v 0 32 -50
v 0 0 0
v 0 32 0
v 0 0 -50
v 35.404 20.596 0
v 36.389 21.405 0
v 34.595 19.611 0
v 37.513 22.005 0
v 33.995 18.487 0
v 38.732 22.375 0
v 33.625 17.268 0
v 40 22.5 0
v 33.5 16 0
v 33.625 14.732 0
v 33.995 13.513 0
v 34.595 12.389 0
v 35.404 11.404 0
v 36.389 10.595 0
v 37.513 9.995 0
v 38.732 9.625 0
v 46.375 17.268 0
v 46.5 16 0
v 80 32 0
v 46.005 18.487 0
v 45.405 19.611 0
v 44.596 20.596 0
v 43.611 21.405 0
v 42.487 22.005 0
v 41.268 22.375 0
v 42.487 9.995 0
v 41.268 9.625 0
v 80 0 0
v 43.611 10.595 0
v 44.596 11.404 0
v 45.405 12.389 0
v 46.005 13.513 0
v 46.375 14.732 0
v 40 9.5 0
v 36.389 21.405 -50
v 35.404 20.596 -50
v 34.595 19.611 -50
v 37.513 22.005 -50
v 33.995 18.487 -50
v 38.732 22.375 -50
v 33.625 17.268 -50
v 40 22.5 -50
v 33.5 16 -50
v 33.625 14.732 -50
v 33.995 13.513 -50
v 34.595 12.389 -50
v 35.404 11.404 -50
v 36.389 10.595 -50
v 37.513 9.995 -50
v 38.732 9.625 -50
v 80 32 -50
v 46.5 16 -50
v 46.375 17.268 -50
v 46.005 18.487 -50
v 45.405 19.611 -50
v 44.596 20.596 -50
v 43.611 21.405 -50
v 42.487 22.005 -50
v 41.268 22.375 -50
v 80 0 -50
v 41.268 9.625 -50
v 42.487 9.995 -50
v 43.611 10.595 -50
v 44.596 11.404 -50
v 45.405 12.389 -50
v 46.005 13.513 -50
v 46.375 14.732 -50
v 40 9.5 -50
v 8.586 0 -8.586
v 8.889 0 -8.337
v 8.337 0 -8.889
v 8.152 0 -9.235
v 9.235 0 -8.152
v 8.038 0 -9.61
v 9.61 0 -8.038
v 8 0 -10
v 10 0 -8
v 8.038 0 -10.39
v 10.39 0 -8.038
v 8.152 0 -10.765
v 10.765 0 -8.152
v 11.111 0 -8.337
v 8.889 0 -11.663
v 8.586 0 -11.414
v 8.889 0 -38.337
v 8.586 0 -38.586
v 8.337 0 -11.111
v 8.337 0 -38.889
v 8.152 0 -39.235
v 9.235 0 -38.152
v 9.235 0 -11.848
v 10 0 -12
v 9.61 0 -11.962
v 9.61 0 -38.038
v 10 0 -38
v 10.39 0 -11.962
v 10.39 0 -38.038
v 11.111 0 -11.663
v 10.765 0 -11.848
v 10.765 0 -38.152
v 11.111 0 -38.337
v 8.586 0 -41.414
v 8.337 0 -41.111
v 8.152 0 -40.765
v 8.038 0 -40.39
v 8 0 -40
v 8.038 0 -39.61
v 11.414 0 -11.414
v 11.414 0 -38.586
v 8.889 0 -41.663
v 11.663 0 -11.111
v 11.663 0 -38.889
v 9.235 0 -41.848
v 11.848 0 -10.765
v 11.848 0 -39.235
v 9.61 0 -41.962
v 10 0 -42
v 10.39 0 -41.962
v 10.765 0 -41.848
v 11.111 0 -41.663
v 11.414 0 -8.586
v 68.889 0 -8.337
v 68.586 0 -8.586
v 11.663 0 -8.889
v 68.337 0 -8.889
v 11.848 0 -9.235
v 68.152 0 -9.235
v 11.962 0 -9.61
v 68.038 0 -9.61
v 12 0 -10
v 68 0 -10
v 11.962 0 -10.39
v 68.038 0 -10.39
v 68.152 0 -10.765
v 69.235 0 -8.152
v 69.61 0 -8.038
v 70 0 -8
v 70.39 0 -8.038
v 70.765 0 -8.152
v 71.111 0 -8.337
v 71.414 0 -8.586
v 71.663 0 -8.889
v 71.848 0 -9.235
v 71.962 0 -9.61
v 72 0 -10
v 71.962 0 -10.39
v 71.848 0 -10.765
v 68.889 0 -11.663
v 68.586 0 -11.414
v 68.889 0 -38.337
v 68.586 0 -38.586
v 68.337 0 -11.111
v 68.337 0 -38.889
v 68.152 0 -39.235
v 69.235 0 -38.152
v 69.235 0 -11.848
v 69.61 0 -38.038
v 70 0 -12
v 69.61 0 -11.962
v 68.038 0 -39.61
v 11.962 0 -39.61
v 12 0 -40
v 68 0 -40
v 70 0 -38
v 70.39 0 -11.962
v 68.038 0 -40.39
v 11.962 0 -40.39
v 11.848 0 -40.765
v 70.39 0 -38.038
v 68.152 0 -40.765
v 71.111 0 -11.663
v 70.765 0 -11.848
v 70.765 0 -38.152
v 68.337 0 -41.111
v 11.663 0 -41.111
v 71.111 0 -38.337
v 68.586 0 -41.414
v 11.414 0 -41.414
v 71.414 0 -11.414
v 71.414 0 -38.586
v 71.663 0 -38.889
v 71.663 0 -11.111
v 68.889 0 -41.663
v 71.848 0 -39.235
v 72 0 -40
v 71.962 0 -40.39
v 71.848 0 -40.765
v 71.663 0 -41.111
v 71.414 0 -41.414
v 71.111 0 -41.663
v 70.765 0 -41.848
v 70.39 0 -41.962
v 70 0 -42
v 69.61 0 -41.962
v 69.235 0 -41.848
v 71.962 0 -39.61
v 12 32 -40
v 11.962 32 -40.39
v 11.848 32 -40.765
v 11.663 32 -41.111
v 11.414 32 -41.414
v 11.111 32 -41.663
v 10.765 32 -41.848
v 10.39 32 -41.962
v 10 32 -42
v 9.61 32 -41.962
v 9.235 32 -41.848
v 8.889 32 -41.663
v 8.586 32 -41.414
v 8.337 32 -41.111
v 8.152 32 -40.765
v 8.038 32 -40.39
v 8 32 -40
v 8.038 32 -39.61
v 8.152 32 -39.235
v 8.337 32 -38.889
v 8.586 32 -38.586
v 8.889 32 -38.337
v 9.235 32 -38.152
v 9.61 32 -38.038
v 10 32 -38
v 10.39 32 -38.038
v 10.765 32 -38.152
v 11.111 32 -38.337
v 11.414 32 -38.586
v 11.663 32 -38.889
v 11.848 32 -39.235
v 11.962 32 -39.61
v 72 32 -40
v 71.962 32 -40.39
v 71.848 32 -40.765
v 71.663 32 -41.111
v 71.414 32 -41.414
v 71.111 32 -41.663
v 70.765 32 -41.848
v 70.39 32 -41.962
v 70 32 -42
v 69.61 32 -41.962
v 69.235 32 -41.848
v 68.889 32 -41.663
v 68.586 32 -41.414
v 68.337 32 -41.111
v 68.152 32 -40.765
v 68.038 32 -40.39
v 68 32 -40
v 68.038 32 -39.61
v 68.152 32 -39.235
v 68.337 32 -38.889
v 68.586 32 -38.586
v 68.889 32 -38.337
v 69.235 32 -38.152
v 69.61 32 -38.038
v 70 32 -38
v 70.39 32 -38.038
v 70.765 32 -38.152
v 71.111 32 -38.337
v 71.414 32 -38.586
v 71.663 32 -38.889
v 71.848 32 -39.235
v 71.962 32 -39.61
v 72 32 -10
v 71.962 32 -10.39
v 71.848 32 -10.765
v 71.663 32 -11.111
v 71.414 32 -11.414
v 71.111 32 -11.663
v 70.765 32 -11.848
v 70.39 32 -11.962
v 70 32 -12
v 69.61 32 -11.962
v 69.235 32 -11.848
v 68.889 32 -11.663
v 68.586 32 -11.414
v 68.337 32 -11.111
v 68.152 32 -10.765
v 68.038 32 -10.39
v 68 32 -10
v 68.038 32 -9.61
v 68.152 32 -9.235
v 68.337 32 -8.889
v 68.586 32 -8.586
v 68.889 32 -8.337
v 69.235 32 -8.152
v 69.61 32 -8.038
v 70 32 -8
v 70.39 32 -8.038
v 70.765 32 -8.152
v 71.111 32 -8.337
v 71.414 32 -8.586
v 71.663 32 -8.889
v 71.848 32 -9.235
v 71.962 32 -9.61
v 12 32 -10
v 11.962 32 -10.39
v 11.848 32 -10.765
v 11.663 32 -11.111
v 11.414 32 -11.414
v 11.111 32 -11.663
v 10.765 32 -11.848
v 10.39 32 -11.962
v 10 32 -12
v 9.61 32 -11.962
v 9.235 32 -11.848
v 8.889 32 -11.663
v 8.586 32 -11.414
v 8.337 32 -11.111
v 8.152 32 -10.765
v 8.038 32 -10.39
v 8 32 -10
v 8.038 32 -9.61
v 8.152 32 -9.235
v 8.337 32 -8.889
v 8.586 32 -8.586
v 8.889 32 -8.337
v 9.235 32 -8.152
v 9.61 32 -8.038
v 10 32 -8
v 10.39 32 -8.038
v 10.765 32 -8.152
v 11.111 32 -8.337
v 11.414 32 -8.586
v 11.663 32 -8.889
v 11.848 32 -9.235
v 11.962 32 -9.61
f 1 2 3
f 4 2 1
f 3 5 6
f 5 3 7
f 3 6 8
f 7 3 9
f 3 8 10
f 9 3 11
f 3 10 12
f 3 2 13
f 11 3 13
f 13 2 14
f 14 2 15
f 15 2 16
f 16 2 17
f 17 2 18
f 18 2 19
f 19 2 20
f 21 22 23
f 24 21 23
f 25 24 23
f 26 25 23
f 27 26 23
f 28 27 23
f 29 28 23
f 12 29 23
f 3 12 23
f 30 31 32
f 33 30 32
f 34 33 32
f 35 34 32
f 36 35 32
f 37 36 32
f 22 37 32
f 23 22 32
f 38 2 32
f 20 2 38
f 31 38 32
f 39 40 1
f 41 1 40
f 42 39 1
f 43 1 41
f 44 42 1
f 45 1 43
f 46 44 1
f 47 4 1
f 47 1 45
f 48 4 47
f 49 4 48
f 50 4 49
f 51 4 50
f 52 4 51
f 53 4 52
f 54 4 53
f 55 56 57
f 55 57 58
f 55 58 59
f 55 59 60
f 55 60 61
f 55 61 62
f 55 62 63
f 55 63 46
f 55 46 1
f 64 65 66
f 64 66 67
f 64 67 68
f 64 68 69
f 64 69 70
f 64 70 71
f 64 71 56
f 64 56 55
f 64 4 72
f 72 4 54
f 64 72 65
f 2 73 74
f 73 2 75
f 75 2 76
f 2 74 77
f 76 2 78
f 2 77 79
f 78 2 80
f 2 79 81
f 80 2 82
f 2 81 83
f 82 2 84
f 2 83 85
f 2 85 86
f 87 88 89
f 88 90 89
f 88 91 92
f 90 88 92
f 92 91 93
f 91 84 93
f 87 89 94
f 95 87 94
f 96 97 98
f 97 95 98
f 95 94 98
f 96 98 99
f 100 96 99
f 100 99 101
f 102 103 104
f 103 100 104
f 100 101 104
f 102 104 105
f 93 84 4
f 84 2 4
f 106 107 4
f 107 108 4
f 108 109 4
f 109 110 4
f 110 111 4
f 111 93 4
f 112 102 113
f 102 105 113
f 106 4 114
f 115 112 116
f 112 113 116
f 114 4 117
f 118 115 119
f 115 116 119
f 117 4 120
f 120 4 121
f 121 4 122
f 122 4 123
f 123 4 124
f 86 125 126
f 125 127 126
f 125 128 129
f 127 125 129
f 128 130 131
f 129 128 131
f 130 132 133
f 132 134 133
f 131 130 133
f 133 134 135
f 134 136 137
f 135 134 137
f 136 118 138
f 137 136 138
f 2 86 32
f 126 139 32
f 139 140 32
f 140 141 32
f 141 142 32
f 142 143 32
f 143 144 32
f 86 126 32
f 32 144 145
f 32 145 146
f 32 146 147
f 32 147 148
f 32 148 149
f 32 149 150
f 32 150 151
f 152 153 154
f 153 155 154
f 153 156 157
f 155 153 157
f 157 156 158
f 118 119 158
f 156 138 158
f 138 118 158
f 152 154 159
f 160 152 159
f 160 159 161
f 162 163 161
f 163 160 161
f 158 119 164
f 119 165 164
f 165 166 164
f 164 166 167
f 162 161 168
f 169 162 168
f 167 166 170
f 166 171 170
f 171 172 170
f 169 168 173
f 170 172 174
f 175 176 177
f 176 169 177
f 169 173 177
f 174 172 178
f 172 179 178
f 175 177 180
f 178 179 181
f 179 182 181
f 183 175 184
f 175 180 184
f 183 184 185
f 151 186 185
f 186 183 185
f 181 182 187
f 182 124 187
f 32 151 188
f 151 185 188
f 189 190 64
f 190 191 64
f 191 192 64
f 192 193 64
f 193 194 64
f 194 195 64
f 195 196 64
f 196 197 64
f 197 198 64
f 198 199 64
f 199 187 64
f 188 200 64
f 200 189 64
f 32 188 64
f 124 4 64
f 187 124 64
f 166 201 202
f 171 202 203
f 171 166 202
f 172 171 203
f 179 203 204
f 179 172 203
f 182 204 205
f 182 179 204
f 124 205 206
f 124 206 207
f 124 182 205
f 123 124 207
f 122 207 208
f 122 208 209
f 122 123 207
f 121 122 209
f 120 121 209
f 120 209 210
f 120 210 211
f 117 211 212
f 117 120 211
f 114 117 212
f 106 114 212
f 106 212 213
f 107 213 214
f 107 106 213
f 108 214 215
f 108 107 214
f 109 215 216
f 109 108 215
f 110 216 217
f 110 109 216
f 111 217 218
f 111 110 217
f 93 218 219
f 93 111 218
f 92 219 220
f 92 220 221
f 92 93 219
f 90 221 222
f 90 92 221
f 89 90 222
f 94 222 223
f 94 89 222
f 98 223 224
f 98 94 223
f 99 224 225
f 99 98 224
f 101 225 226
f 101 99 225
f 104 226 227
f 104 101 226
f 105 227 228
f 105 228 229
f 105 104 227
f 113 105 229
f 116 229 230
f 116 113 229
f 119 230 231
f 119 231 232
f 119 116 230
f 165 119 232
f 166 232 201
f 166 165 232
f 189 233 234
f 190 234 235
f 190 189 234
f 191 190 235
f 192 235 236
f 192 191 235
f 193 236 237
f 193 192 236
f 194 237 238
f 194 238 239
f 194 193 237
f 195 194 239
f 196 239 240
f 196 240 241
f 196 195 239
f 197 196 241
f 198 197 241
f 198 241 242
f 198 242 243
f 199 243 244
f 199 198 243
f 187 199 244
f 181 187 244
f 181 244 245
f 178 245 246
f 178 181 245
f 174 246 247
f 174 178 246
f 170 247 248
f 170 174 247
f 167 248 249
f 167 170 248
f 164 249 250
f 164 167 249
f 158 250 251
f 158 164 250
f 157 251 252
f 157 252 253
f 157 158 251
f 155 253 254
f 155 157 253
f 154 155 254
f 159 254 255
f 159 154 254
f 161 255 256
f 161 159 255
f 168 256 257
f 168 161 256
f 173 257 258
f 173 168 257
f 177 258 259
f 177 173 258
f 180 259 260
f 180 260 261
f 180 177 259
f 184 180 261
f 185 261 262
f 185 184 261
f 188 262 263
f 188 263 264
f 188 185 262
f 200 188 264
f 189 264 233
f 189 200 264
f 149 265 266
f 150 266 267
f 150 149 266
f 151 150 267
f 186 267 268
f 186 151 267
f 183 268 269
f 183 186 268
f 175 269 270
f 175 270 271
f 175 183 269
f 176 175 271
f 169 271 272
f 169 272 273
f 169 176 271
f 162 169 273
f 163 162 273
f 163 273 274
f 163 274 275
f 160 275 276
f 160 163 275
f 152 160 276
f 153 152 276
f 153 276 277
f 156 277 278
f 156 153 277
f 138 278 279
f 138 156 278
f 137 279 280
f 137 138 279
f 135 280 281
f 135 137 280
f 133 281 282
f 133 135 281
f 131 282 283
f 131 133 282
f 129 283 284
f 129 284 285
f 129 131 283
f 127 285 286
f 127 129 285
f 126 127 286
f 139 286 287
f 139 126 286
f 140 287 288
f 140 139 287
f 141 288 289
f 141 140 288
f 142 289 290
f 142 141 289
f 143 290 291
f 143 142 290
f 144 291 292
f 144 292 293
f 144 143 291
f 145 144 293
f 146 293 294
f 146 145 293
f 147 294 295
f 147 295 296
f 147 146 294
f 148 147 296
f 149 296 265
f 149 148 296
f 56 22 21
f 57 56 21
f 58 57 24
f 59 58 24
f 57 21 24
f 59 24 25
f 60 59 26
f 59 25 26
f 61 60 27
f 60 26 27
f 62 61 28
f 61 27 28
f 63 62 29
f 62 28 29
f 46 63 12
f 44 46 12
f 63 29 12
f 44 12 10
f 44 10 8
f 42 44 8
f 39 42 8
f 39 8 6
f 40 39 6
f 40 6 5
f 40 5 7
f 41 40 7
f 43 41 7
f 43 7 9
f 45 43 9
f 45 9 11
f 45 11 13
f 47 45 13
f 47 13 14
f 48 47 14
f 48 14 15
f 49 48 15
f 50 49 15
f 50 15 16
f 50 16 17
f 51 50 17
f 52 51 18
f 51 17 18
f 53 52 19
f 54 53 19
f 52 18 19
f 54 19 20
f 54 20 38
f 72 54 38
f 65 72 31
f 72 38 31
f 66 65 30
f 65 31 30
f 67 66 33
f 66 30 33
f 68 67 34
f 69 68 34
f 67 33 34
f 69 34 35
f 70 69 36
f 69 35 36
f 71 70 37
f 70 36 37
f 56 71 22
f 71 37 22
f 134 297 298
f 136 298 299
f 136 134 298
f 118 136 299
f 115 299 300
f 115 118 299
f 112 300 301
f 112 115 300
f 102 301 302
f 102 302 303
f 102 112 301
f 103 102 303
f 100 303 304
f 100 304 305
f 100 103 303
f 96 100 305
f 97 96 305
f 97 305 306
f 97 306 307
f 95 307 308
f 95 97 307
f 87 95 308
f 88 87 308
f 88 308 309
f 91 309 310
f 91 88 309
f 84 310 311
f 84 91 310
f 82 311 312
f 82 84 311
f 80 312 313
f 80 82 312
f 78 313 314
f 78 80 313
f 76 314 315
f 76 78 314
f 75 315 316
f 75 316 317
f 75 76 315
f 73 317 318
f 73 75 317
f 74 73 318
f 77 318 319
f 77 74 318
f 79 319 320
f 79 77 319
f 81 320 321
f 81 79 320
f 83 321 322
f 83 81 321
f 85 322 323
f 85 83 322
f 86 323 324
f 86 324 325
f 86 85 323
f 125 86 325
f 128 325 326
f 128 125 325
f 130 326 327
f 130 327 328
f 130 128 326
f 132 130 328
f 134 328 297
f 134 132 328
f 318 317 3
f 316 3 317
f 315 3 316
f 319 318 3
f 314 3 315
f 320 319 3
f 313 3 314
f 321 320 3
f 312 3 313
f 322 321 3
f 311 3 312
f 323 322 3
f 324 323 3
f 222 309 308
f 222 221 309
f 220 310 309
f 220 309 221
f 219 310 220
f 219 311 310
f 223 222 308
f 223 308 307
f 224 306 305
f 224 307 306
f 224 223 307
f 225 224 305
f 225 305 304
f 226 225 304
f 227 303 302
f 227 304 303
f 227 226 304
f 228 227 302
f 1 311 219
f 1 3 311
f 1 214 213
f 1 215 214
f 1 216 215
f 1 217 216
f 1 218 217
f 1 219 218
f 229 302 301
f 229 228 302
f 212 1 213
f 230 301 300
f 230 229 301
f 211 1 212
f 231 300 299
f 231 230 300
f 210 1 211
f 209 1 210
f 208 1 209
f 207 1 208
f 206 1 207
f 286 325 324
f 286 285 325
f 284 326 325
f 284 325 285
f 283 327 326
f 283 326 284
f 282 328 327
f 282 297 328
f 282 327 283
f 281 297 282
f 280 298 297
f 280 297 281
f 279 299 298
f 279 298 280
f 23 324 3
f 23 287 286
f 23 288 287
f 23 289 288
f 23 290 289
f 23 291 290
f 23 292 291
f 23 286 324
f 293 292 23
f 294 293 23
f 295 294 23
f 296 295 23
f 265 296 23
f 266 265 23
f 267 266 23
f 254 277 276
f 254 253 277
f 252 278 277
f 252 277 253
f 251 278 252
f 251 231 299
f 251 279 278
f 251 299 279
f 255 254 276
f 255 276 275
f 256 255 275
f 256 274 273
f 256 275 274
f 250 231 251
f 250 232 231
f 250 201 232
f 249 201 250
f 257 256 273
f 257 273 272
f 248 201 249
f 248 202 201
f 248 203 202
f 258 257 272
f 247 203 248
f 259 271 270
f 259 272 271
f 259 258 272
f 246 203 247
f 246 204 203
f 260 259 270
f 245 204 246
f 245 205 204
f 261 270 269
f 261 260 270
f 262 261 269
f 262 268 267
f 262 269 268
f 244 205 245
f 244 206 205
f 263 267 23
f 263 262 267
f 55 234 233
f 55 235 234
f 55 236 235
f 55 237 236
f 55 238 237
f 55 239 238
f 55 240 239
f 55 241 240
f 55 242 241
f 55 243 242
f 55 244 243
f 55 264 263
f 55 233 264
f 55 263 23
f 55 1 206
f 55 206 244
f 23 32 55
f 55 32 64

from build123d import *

# Parameters (mm, degrees)
SKETCH1_W           = 80
SKETCH1_H           = 50
SKETCH1_R           = 2
BOSS_EXTRUDE1_DEPTH = 32
SKETCH2_R           = 6.5
CUT_EXTRUDE1_DEPTH  = 51


with BuildPart() as part:
    # Sketch1 → Boss-Extrude1 (new body)
    with BuildSketch(Plane(origin=(0, 0, 0), x_dir=(1, 0, 0), z_dir=(0, 1, 0))):
        with Locations((40, 25)):
            Rectangle(SKETCH1_W, SKETCH1_H)
        with Locations((10, 40)):
            Circle(SKETCH1_R, mode=Mode.SUBTRACT)
        with Locations((70, 40)):
            Circle(SKETCH1_R, mode=Mode.SUBTRACT)
        with Locations((70, 10)):
            Circle(SKETCH1_R, mode=Mode.SUBTRACT)
        with Locations((10, 10)):
            Circle(SKETCH1_R, mode=Mode.SUBTRACT)
    extrude(amount=BOSS_EXTRUDE1_DEPTH)

    # Sketch2 → Cut-Extrude1 (cut, through all)
    with BuildSketch(Plane.XY):
        with Locations((40, 16)):
            Circle(SKETCH2_R)
    extrude(amount=-CUT_EXTRUDE1_DEPTH, mode=Mode.SUBTRACT)


solid = part.part
